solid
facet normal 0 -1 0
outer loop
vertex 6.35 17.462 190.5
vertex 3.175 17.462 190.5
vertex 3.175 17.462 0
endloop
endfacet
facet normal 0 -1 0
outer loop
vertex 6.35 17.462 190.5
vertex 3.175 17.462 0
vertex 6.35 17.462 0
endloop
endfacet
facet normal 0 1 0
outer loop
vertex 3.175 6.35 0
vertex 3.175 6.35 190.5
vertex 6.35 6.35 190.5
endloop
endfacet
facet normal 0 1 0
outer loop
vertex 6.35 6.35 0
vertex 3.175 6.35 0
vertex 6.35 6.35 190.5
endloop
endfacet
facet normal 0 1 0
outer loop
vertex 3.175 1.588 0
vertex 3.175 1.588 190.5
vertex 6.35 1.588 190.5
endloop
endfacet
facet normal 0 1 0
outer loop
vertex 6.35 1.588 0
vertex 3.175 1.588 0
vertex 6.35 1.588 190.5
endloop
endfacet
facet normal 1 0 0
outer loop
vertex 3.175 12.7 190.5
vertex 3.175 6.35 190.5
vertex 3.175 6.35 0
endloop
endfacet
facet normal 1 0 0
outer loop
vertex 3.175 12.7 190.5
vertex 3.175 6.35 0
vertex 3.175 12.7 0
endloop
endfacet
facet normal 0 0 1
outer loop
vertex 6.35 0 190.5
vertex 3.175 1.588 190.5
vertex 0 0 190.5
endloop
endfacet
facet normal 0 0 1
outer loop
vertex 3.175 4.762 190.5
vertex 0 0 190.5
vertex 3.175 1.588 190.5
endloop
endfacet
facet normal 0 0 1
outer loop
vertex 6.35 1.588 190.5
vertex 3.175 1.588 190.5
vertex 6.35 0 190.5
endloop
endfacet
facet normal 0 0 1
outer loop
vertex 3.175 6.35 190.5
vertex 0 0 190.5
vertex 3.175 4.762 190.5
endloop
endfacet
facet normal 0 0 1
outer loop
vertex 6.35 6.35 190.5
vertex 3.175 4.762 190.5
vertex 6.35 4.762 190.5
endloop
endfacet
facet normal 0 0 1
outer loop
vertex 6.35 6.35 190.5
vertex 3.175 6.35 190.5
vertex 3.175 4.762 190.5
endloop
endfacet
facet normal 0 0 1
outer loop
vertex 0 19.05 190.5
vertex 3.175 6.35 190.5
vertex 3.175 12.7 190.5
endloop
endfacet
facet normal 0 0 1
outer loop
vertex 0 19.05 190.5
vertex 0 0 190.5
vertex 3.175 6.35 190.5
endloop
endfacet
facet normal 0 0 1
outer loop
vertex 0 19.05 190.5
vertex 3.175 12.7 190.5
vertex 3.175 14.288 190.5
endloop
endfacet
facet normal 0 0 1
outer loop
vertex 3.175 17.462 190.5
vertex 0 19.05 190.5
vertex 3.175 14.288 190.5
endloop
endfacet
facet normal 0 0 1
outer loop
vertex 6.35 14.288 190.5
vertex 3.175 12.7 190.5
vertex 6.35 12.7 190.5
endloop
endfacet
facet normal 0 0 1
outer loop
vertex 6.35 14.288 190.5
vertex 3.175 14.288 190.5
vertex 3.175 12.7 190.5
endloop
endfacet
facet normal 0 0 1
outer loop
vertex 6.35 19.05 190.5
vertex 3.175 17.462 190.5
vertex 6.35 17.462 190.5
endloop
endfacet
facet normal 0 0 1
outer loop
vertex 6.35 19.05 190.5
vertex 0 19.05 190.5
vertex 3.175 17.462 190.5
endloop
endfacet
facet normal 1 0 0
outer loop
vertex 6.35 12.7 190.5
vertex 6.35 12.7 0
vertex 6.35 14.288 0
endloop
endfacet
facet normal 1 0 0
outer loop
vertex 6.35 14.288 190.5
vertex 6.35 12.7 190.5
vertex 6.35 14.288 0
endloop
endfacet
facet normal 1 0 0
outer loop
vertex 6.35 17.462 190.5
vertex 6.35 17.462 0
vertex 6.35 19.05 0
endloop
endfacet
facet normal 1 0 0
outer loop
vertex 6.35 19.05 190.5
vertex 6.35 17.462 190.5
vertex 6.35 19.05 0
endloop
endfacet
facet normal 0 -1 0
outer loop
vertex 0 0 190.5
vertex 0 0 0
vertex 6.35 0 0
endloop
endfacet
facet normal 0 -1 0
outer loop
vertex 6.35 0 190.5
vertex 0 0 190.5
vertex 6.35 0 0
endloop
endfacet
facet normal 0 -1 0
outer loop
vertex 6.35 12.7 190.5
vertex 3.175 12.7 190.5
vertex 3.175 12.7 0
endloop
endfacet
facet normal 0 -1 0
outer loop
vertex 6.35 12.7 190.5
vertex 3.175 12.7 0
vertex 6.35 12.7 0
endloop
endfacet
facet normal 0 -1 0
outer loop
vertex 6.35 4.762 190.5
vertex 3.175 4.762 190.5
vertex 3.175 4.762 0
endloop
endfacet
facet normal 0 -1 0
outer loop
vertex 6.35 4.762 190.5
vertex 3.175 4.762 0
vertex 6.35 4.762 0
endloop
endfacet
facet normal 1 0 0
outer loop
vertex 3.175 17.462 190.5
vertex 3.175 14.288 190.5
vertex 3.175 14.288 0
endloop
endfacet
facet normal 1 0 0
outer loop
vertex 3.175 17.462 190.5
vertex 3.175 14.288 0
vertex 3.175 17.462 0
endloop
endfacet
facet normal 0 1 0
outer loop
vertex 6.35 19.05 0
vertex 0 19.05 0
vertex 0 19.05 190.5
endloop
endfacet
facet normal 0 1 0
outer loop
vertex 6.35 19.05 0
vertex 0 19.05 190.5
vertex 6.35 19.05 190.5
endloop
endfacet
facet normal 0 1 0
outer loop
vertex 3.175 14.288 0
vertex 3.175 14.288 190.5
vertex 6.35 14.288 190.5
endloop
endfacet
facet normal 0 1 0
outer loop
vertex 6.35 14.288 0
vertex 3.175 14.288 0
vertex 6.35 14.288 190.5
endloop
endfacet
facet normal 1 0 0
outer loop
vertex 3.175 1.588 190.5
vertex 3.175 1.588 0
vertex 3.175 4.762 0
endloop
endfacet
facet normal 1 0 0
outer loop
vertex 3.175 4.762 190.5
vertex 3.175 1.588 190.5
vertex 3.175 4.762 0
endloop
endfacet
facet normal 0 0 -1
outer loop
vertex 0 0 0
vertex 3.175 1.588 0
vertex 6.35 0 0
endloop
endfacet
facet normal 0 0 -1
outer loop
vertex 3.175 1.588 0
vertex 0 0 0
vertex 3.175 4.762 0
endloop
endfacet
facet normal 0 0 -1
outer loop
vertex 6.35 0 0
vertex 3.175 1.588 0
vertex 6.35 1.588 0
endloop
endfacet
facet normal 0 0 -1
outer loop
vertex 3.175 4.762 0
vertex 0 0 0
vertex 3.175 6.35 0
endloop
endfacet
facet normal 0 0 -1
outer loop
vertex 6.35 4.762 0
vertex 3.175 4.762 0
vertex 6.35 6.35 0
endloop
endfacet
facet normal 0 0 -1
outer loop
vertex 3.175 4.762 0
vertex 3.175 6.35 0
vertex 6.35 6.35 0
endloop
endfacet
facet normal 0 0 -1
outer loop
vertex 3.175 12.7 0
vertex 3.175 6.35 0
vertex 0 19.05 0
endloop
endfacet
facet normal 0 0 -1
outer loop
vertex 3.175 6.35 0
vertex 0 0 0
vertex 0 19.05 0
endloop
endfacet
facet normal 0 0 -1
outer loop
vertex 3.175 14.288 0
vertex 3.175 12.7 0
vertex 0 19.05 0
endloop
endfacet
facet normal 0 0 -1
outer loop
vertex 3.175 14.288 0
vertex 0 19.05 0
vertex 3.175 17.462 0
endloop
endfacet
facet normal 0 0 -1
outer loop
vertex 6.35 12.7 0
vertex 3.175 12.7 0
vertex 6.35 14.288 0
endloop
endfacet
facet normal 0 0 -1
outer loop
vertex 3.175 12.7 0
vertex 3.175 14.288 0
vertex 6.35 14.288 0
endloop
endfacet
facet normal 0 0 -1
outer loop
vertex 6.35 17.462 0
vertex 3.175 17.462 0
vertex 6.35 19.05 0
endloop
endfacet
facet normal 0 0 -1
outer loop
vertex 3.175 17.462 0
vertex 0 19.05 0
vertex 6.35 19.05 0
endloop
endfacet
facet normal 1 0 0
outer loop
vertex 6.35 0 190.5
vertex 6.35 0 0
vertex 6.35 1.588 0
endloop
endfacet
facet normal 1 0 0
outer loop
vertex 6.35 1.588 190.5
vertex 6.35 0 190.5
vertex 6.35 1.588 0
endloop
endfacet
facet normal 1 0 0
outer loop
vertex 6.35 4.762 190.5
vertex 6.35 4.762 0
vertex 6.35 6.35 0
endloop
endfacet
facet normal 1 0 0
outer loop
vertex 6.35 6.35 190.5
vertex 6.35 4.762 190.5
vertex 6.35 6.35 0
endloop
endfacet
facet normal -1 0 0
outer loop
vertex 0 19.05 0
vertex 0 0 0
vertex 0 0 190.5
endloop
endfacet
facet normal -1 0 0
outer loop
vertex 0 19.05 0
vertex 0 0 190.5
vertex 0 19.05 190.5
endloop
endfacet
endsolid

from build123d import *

# Parameters (mm, degrees)
SKETCH1_W           = 6.35
SKETCH1_H           = 19.05
BOSS_EXTRUDE1_DEPTH = 190.5
CUT_EXTRUDE2_REACH  = 193.555
SKETCH3_W           = 3.175
SKETCH3_H           = 6.35
SKETCH3_H_2         = 3.175


with BuildPart() as part:
    # Sketch1 → Boss-Extrude1 (new body)
    with BuildSketch(Plane.XY):
        with Locations((3.175, 9.525)):
            Rectangle(SKETCH1_W, SKETCH1_H)
    extrude(amount=BOSS_EXTRUDE1_DEPTH)

    # Sketch3 → Cut-Extrude2 (cut, up to next)
    with BuildSketch(Plane.XY.offset(190.5), mode=Mode.PRIVATE) as cut_extrude2_sk1:
        with Locations((4.7625, 9.525)):
            Rectangle(SKETCH3_W, SKETCH3_H)
    cut_extrude2_tool1 = extrude(cut_extrude2_sk1.sketch, amount=-CUT_EXTRUDE2_REACH, mode=Mode.PRIVATE) & part.part
    # Sketch3 → Cut-Extrude2 (cut, up to next)
    with BuildSketch(Plane.XY.offset(190.5), mode=Mode.PRIVATE) as cut_extrude2_sk2:
        with Locations((4.7625, 15.875)):
            Rectangle(SKETCH3_W, SKETCH3_H_2)
    cut_extrude2_tool2 = extrude(cut_extrude2_sk2.sketch, amount=-CUT_EXTRUDE2_REACH, mode=Mode.PRIVATE) & part.part
    # Sketch3 → Cut-Extrude2 (cut, up to next)
    with BuildSketch(Plane.XY.offset(190.5), mode=Mode.PRIVATE) as cut_extrude2_sk3:
        with Locations((4.7625, 3.175)):
            Rectangle(SKETCH3_W, SKETCH3_H_2)
    cut_extrude2_tool3 = extrude(cut_extrude2_sk3.sketch, amount=-CUT_EXTRUDE2_REACH, mode=Mode.PRIVATE) & part.part
    add(cut_extrude2_tool1.solids().sort_by_distance((4.7625, 9.525, 190.5))[0], mode=Mode.SUBTRACT)
    add(cut_extrude2_tool2.solids().sort_by_distance((4.7625, 15.875, 190.5))[0], mode=Mode.SUBTRACT)
    add(cut_extrude2_tool3.solids().sort_by_distance((4.7625, 3.175, 190.5))[0], mode=Mode.SUBTRACT)


solid = part.part
